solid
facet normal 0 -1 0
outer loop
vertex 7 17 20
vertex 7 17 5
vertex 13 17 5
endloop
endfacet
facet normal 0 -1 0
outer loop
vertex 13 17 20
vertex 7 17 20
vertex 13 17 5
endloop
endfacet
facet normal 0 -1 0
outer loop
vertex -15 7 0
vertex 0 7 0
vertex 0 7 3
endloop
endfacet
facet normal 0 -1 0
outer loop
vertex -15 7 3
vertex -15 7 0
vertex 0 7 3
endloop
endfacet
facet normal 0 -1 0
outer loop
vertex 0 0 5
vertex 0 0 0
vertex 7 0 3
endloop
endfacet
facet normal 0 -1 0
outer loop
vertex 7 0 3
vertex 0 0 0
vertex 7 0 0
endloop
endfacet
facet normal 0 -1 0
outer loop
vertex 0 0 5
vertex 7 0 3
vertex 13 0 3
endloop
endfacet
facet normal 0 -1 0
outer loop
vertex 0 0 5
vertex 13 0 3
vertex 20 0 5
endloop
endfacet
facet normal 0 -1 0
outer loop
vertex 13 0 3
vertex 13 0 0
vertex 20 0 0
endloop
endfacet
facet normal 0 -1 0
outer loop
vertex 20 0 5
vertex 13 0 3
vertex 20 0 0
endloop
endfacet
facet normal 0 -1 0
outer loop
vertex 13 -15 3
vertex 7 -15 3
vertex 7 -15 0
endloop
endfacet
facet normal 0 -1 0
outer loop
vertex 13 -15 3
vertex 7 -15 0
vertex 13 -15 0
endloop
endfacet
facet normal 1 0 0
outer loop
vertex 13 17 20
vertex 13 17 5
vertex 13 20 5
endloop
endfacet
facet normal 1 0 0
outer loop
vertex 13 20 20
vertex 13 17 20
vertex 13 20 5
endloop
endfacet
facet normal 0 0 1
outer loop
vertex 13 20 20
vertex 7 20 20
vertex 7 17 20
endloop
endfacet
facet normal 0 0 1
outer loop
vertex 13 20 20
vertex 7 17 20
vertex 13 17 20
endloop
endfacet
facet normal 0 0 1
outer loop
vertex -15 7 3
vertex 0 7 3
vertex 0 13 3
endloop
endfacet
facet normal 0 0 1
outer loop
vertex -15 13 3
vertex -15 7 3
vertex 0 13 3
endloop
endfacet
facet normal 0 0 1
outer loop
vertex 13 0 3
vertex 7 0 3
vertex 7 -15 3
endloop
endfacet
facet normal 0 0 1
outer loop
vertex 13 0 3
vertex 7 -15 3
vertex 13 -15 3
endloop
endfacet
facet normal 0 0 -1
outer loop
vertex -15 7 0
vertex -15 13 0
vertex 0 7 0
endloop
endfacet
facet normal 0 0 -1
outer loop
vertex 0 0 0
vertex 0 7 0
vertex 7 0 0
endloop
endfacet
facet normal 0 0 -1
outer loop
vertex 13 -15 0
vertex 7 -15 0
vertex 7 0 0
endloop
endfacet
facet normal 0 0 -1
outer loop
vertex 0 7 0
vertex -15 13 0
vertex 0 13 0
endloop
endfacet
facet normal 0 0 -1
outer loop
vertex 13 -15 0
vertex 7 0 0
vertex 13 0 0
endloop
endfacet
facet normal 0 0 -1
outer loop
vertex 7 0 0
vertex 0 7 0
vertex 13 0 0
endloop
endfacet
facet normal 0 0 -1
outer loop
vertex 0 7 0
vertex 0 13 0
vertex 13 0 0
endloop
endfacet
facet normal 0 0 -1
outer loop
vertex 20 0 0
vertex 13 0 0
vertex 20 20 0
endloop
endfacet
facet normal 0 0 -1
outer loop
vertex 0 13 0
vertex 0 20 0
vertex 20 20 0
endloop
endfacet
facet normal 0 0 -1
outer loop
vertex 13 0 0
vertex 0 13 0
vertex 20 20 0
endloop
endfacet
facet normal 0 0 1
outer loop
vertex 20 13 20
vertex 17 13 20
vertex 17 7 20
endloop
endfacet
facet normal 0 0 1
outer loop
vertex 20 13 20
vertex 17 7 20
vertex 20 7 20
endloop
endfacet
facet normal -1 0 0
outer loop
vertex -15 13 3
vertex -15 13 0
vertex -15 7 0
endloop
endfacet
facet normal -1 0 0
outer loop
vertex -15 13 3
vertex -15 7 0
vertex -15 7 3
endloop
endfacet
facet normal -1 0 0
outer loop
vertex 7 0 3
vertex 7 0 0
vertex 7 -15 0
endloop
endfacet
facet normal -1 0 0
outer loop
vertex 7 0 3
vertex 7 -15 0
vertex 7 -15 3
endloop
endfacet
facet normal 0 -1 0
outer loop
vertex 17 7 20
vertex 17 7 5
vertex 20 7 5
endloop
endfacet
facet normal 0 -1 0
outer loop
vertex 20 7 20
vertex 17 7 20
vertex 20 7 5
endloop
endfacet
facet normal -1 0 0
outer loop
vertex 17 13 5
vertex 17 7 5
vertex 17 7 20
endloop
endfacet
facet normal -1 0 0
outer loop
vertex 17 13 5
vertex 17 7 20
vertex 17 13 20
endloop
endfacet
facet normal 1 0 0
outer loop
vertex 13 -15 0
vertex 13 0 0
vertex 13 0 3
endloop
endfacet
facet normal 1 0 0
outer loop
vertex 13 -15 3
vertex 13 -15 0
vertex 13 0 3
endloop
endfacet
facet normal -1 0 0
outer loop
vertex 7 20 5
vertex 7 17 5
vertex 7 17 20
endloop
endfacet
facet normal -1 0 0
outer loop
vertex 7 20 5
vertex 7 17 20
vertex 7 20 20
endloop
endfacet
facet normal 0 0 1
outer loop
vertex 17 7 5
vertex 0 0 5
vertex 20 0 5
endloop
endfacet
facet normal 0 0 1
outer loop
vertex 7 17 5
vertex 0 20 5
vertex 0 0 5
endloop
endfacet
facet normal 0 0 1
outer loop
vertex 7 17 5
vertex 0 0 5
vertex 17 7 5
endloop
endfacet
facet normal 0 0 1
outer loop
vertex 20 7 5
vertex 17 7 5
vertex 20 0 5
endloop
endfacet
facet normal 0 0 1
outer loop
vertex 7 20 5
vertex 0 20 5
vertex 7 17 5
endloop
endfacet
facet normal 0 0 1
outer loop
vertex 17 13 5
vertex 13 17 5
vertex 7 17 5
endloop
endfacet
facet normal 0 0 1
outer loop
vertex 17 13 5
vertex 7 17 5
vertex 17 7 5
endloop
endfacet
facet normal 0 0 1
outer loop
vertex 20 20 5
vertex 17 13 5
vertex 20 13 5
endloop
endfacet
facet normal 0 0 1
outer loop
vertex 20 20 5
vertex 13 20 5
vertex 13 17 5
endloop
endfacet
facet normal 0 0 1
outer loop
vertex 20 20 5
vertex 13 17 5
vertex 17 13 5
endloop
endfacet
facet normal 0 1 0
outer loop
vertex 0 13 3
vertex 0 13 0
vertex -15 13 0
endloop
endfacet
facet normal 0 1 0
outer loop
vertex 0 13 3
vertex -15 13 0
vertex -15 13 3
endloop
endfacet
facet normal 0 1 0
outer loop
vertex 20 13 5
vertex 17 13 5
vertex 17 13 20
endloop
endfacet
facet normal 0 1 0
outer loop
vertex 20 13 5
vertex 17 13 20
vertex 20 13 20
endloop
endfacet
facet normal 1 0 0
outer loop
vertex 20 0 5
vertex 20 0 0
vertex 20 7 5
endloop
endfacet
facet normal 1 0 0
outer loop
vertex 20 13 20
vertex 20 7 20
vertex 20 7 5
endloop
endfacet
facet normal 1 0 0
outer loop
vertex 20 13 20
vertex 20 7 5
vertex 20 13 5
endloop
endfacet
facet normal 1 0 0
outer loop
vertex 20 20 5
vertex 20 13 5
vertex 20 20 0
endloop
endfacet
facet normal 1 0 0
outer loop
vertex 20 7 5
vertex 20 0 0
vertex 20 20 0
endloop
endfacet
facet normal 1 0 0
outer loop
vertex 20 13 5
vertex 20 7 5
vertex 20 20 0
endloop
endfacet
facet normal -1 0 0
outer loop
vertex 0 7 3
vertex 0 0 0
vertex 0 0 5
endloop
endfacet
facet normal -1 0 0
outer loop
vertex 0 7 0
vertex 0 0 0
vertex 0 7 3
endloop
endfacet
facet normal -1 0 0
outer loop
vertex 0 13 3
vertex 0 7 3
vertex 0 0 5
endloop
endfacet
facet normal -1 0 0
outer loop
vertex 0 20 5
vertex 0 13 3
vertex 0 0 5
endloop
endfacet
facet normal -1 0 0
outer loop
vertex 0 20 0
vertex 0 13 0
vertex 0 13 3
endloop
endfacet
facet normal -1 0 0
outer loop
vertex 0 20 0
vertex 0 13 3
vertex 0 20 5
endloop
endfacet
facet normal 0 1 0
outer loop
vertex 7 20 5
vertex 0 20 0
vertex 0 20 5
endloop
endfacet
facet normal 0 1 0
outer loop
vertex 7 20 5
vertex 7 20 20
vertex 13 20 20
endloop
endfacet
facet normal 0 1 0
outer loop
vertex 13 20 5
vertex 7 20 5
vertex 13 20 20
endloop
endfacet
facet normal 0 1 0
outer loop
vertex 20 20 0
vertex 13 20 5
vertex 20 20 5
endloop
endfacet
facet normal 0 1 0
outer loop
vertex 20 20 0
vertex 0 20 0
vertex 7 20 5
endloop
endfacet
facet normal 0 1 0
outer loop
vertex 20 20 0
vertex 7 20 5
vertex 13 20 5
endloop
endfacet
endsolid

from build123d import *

# Parameters (mm, degrees)
SKETCH_1_W      = 20
SKETCH_1_H      = 20
EXTRUDE_1_DEPTH = 5
SKETCH_2_W      = 6
SKETCH_2_H      = 3
SKETCH_2_W_2    = 3
SKETCH_2_H_2    = 6
EXTRUDE_2_DEPTH = 15
SKETCH_3_W      = 6
SKETCH_3_H      = 3
EXTRUDE_3_DEPTH = 15
SKETCH_4_W      = 3
SKETCH_4_H      = 6
EXTRUDE_4_DEPTH = 15


with BuildPart() as part:
    # Эскиз1 → Бобышка-Вытянуть1 (new body)
    with BuildSketch(Plane.XY):
        with Locations((10, 10)):
            Rectangle(SKETCH_1_W, SKETCH_1_H)
    extrude(amount=EXTRUDE_1_DEPTH)

    # Эскиз2 → Бобышка-Вытянуть2 (add)
    with BuildSketch(Plane.XY.offset(5)):
        with Locations((10, 18.5)):
            Rectangle(SKETCH_2_W, SKETCH_2_H)
        with Locations((18.5, 10)):
            Rectangle(SKETCH_2_W_2, SKETCH_2_H_2)
    extrude(amount=EXTRUDE_2_DEPTH)

    # Эскиз3 → Бобышка-Вытянуть3 (add)
    with BuildSketch(Plane.XZ):
        with Locations((10, 1.5)):
            Rectangle(SKETCH_3_W, SKETCH_3_H)
    extrude(amount=EXTRUDE_3_DEPTH)

    # Эскиз4 → Бобышка-Вытянуть4 (add)
    with BuildSketch(Plane.ZY):
        with Locations((1.5, 10)):
            Rectangle(SKETCH_4_W, SKETCH_4_H)
    extrude(amount=EXTRUDE_4_DEPTH)


solid = part.part
